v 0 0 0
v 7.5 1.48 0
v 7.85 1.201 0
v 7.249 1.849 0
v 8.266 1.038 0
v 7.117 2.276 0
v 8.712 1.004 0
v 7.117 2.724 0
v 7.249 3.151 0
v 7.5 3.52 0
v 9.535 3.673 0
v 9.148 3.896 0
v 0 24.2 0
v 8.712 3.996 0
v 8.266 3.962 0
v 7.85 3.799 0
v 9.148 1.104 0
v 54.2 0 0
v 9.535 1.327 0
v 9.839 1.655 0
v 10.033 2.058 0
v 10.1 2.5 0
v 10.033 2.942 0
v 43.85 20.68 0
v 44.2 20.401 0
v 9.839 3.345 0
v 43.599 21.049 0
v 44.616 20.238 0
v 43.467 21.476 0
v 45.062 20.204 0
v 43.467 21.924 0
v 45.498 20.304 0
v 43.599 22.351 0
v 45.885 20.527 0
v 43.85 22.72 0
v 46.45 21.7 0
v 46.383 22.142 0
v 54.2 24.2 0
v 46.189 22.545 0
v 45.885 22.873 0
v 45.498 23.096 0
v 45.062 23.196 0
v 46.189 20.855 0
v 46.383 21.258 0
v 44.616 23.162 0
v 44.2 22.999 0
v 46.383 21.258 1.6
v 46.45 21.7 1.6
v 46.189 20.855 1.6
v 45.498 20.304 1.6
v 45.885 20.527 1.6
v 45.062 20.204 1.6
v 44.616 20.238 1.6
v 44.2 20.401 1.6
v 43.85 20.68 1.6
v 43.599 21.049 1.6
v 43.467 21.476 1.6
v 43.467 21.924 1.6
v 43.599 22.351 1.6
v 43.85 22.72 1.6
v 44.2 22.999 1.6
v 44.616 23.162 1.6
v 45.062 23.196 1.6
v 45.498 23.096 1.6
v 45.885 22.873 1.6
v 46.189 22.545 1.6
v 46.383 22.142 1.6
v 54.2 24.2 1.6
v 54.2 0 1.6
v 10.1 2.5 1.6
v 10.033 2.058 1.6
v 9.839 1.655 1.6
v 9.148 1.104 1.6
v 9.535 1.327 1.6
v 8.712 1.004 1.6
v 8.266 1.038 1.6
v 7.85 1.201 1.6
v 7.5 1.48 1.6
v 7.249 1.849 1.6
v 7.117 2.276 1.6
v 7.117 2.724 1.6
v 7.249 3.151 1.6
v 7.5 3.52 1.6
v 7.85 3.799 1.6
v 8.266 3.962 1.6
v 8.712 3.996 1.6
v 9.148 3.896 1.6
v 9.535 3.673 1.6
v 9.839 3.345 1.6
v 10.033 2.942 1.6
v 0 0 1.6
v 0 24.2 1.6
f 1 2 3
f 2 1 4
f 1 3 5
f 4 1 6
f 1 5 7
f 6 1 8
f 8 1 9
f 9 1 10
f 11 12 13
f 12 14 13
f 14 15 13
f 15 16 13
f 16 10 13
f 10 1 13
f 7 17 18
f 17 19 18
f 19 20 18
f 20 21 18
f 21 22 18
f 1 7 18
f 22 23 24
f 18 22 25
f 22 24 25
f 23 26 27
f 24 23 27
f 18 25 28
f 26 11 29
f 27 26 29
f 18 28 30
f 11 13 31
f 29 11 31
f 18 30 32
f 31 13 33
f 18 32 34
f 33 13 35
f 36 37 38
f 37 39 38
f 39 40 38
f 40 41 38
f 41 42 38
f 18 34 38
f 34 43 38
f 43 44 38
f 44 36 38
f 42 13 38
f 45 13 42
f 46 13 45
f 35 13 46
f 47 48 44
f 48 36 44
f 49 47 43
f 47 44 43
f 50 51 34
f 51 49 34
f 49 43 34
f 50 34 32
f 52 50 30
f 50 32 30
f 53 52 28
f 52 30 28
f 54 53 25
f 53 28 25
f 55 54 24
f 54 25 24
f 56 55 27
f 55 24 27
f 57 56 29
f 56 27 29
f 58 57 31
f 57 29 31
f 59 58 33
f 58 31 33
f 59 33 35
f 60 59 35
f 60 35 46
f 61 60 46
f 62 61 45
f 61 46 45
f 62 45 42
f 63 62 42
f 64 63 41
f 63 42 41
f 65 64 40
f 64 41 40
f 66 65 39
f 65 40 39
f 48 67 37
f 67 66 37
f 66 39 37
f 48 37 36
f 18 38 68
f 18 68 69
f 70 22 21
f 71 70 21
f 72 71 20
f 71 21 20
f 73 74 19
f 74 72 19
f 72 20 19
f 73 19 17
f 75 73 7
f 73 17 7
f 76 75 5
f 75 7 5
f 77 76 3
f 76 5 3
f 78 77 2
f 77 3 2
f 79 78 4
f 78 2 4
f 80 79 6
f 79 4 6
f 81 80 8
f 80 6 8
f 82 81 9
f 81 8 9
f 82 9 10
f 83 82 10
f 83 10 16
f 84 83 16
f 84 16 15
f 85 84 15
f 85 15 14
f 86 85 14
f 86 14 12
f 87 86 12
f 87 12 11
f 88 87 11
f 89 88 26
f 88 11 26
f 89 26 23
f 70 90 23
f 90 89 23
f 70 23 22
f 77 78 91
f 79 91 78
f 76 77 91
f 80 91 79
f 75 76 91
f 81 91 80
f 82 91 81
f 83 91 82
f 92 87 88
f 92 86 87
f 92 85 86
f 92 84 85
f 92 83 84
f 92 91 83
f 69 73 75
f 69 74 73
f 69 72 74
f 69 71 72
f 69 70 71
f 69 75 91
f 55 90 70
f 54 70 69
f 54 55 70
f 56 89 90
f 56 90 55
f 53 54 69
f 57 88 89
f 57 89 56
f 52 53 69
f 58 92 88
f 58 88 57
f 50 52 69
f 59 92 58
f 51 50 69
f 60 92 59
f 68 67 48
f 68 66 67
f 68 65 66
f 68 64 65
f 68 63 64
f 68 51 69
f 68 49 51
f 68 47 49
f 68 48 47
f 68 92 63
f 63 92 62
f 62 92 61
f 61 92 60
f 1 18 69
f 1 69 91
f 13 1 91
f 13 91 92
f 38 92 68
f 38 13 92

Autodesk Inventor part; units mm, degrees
ref_plane "YZ Plane" through (0, 0, 0) normal (1, 0, 0) x (0, 1, 0)
ref_plane "XZ Plane" through (0, 0, 0) normal (0, 1, 0) x (-1, 0, 0)
ref_plane "XY Plane" through (0, 0, 0) normal (0, 0, 1) x (1, 0, 0)
sketch "Sketch1" plane through (0, 0, 0) normal (0, 0, 1) x (1, 0, 0)
  line L0 (0, 24.2) -> (54.2, 24.2)
  line L1 (54.2, 24.2) -> (54.2, 0)
  line L2 (54.2, 0) -> (0, 0)
  line L3 (0, 0) -> (0, 24.2)
  circle A0 centre (44.95, 21.7) radius 1.5
  circle A1 centre (8.6, 2.5) radius 1.5
  dimension "d0" = 54.2
  dimension "d1" = 24.2
  dimension "d2" = 3
  dimension "d3" = 2.5
  dimension "d4" = 9.25
  dimension "d5" = 2.5
  dimension "d6" = 8.6
extrude "Extrusion1" add sketch "Sketch1" along normal blind 1.6
properties part number "XL4015"
